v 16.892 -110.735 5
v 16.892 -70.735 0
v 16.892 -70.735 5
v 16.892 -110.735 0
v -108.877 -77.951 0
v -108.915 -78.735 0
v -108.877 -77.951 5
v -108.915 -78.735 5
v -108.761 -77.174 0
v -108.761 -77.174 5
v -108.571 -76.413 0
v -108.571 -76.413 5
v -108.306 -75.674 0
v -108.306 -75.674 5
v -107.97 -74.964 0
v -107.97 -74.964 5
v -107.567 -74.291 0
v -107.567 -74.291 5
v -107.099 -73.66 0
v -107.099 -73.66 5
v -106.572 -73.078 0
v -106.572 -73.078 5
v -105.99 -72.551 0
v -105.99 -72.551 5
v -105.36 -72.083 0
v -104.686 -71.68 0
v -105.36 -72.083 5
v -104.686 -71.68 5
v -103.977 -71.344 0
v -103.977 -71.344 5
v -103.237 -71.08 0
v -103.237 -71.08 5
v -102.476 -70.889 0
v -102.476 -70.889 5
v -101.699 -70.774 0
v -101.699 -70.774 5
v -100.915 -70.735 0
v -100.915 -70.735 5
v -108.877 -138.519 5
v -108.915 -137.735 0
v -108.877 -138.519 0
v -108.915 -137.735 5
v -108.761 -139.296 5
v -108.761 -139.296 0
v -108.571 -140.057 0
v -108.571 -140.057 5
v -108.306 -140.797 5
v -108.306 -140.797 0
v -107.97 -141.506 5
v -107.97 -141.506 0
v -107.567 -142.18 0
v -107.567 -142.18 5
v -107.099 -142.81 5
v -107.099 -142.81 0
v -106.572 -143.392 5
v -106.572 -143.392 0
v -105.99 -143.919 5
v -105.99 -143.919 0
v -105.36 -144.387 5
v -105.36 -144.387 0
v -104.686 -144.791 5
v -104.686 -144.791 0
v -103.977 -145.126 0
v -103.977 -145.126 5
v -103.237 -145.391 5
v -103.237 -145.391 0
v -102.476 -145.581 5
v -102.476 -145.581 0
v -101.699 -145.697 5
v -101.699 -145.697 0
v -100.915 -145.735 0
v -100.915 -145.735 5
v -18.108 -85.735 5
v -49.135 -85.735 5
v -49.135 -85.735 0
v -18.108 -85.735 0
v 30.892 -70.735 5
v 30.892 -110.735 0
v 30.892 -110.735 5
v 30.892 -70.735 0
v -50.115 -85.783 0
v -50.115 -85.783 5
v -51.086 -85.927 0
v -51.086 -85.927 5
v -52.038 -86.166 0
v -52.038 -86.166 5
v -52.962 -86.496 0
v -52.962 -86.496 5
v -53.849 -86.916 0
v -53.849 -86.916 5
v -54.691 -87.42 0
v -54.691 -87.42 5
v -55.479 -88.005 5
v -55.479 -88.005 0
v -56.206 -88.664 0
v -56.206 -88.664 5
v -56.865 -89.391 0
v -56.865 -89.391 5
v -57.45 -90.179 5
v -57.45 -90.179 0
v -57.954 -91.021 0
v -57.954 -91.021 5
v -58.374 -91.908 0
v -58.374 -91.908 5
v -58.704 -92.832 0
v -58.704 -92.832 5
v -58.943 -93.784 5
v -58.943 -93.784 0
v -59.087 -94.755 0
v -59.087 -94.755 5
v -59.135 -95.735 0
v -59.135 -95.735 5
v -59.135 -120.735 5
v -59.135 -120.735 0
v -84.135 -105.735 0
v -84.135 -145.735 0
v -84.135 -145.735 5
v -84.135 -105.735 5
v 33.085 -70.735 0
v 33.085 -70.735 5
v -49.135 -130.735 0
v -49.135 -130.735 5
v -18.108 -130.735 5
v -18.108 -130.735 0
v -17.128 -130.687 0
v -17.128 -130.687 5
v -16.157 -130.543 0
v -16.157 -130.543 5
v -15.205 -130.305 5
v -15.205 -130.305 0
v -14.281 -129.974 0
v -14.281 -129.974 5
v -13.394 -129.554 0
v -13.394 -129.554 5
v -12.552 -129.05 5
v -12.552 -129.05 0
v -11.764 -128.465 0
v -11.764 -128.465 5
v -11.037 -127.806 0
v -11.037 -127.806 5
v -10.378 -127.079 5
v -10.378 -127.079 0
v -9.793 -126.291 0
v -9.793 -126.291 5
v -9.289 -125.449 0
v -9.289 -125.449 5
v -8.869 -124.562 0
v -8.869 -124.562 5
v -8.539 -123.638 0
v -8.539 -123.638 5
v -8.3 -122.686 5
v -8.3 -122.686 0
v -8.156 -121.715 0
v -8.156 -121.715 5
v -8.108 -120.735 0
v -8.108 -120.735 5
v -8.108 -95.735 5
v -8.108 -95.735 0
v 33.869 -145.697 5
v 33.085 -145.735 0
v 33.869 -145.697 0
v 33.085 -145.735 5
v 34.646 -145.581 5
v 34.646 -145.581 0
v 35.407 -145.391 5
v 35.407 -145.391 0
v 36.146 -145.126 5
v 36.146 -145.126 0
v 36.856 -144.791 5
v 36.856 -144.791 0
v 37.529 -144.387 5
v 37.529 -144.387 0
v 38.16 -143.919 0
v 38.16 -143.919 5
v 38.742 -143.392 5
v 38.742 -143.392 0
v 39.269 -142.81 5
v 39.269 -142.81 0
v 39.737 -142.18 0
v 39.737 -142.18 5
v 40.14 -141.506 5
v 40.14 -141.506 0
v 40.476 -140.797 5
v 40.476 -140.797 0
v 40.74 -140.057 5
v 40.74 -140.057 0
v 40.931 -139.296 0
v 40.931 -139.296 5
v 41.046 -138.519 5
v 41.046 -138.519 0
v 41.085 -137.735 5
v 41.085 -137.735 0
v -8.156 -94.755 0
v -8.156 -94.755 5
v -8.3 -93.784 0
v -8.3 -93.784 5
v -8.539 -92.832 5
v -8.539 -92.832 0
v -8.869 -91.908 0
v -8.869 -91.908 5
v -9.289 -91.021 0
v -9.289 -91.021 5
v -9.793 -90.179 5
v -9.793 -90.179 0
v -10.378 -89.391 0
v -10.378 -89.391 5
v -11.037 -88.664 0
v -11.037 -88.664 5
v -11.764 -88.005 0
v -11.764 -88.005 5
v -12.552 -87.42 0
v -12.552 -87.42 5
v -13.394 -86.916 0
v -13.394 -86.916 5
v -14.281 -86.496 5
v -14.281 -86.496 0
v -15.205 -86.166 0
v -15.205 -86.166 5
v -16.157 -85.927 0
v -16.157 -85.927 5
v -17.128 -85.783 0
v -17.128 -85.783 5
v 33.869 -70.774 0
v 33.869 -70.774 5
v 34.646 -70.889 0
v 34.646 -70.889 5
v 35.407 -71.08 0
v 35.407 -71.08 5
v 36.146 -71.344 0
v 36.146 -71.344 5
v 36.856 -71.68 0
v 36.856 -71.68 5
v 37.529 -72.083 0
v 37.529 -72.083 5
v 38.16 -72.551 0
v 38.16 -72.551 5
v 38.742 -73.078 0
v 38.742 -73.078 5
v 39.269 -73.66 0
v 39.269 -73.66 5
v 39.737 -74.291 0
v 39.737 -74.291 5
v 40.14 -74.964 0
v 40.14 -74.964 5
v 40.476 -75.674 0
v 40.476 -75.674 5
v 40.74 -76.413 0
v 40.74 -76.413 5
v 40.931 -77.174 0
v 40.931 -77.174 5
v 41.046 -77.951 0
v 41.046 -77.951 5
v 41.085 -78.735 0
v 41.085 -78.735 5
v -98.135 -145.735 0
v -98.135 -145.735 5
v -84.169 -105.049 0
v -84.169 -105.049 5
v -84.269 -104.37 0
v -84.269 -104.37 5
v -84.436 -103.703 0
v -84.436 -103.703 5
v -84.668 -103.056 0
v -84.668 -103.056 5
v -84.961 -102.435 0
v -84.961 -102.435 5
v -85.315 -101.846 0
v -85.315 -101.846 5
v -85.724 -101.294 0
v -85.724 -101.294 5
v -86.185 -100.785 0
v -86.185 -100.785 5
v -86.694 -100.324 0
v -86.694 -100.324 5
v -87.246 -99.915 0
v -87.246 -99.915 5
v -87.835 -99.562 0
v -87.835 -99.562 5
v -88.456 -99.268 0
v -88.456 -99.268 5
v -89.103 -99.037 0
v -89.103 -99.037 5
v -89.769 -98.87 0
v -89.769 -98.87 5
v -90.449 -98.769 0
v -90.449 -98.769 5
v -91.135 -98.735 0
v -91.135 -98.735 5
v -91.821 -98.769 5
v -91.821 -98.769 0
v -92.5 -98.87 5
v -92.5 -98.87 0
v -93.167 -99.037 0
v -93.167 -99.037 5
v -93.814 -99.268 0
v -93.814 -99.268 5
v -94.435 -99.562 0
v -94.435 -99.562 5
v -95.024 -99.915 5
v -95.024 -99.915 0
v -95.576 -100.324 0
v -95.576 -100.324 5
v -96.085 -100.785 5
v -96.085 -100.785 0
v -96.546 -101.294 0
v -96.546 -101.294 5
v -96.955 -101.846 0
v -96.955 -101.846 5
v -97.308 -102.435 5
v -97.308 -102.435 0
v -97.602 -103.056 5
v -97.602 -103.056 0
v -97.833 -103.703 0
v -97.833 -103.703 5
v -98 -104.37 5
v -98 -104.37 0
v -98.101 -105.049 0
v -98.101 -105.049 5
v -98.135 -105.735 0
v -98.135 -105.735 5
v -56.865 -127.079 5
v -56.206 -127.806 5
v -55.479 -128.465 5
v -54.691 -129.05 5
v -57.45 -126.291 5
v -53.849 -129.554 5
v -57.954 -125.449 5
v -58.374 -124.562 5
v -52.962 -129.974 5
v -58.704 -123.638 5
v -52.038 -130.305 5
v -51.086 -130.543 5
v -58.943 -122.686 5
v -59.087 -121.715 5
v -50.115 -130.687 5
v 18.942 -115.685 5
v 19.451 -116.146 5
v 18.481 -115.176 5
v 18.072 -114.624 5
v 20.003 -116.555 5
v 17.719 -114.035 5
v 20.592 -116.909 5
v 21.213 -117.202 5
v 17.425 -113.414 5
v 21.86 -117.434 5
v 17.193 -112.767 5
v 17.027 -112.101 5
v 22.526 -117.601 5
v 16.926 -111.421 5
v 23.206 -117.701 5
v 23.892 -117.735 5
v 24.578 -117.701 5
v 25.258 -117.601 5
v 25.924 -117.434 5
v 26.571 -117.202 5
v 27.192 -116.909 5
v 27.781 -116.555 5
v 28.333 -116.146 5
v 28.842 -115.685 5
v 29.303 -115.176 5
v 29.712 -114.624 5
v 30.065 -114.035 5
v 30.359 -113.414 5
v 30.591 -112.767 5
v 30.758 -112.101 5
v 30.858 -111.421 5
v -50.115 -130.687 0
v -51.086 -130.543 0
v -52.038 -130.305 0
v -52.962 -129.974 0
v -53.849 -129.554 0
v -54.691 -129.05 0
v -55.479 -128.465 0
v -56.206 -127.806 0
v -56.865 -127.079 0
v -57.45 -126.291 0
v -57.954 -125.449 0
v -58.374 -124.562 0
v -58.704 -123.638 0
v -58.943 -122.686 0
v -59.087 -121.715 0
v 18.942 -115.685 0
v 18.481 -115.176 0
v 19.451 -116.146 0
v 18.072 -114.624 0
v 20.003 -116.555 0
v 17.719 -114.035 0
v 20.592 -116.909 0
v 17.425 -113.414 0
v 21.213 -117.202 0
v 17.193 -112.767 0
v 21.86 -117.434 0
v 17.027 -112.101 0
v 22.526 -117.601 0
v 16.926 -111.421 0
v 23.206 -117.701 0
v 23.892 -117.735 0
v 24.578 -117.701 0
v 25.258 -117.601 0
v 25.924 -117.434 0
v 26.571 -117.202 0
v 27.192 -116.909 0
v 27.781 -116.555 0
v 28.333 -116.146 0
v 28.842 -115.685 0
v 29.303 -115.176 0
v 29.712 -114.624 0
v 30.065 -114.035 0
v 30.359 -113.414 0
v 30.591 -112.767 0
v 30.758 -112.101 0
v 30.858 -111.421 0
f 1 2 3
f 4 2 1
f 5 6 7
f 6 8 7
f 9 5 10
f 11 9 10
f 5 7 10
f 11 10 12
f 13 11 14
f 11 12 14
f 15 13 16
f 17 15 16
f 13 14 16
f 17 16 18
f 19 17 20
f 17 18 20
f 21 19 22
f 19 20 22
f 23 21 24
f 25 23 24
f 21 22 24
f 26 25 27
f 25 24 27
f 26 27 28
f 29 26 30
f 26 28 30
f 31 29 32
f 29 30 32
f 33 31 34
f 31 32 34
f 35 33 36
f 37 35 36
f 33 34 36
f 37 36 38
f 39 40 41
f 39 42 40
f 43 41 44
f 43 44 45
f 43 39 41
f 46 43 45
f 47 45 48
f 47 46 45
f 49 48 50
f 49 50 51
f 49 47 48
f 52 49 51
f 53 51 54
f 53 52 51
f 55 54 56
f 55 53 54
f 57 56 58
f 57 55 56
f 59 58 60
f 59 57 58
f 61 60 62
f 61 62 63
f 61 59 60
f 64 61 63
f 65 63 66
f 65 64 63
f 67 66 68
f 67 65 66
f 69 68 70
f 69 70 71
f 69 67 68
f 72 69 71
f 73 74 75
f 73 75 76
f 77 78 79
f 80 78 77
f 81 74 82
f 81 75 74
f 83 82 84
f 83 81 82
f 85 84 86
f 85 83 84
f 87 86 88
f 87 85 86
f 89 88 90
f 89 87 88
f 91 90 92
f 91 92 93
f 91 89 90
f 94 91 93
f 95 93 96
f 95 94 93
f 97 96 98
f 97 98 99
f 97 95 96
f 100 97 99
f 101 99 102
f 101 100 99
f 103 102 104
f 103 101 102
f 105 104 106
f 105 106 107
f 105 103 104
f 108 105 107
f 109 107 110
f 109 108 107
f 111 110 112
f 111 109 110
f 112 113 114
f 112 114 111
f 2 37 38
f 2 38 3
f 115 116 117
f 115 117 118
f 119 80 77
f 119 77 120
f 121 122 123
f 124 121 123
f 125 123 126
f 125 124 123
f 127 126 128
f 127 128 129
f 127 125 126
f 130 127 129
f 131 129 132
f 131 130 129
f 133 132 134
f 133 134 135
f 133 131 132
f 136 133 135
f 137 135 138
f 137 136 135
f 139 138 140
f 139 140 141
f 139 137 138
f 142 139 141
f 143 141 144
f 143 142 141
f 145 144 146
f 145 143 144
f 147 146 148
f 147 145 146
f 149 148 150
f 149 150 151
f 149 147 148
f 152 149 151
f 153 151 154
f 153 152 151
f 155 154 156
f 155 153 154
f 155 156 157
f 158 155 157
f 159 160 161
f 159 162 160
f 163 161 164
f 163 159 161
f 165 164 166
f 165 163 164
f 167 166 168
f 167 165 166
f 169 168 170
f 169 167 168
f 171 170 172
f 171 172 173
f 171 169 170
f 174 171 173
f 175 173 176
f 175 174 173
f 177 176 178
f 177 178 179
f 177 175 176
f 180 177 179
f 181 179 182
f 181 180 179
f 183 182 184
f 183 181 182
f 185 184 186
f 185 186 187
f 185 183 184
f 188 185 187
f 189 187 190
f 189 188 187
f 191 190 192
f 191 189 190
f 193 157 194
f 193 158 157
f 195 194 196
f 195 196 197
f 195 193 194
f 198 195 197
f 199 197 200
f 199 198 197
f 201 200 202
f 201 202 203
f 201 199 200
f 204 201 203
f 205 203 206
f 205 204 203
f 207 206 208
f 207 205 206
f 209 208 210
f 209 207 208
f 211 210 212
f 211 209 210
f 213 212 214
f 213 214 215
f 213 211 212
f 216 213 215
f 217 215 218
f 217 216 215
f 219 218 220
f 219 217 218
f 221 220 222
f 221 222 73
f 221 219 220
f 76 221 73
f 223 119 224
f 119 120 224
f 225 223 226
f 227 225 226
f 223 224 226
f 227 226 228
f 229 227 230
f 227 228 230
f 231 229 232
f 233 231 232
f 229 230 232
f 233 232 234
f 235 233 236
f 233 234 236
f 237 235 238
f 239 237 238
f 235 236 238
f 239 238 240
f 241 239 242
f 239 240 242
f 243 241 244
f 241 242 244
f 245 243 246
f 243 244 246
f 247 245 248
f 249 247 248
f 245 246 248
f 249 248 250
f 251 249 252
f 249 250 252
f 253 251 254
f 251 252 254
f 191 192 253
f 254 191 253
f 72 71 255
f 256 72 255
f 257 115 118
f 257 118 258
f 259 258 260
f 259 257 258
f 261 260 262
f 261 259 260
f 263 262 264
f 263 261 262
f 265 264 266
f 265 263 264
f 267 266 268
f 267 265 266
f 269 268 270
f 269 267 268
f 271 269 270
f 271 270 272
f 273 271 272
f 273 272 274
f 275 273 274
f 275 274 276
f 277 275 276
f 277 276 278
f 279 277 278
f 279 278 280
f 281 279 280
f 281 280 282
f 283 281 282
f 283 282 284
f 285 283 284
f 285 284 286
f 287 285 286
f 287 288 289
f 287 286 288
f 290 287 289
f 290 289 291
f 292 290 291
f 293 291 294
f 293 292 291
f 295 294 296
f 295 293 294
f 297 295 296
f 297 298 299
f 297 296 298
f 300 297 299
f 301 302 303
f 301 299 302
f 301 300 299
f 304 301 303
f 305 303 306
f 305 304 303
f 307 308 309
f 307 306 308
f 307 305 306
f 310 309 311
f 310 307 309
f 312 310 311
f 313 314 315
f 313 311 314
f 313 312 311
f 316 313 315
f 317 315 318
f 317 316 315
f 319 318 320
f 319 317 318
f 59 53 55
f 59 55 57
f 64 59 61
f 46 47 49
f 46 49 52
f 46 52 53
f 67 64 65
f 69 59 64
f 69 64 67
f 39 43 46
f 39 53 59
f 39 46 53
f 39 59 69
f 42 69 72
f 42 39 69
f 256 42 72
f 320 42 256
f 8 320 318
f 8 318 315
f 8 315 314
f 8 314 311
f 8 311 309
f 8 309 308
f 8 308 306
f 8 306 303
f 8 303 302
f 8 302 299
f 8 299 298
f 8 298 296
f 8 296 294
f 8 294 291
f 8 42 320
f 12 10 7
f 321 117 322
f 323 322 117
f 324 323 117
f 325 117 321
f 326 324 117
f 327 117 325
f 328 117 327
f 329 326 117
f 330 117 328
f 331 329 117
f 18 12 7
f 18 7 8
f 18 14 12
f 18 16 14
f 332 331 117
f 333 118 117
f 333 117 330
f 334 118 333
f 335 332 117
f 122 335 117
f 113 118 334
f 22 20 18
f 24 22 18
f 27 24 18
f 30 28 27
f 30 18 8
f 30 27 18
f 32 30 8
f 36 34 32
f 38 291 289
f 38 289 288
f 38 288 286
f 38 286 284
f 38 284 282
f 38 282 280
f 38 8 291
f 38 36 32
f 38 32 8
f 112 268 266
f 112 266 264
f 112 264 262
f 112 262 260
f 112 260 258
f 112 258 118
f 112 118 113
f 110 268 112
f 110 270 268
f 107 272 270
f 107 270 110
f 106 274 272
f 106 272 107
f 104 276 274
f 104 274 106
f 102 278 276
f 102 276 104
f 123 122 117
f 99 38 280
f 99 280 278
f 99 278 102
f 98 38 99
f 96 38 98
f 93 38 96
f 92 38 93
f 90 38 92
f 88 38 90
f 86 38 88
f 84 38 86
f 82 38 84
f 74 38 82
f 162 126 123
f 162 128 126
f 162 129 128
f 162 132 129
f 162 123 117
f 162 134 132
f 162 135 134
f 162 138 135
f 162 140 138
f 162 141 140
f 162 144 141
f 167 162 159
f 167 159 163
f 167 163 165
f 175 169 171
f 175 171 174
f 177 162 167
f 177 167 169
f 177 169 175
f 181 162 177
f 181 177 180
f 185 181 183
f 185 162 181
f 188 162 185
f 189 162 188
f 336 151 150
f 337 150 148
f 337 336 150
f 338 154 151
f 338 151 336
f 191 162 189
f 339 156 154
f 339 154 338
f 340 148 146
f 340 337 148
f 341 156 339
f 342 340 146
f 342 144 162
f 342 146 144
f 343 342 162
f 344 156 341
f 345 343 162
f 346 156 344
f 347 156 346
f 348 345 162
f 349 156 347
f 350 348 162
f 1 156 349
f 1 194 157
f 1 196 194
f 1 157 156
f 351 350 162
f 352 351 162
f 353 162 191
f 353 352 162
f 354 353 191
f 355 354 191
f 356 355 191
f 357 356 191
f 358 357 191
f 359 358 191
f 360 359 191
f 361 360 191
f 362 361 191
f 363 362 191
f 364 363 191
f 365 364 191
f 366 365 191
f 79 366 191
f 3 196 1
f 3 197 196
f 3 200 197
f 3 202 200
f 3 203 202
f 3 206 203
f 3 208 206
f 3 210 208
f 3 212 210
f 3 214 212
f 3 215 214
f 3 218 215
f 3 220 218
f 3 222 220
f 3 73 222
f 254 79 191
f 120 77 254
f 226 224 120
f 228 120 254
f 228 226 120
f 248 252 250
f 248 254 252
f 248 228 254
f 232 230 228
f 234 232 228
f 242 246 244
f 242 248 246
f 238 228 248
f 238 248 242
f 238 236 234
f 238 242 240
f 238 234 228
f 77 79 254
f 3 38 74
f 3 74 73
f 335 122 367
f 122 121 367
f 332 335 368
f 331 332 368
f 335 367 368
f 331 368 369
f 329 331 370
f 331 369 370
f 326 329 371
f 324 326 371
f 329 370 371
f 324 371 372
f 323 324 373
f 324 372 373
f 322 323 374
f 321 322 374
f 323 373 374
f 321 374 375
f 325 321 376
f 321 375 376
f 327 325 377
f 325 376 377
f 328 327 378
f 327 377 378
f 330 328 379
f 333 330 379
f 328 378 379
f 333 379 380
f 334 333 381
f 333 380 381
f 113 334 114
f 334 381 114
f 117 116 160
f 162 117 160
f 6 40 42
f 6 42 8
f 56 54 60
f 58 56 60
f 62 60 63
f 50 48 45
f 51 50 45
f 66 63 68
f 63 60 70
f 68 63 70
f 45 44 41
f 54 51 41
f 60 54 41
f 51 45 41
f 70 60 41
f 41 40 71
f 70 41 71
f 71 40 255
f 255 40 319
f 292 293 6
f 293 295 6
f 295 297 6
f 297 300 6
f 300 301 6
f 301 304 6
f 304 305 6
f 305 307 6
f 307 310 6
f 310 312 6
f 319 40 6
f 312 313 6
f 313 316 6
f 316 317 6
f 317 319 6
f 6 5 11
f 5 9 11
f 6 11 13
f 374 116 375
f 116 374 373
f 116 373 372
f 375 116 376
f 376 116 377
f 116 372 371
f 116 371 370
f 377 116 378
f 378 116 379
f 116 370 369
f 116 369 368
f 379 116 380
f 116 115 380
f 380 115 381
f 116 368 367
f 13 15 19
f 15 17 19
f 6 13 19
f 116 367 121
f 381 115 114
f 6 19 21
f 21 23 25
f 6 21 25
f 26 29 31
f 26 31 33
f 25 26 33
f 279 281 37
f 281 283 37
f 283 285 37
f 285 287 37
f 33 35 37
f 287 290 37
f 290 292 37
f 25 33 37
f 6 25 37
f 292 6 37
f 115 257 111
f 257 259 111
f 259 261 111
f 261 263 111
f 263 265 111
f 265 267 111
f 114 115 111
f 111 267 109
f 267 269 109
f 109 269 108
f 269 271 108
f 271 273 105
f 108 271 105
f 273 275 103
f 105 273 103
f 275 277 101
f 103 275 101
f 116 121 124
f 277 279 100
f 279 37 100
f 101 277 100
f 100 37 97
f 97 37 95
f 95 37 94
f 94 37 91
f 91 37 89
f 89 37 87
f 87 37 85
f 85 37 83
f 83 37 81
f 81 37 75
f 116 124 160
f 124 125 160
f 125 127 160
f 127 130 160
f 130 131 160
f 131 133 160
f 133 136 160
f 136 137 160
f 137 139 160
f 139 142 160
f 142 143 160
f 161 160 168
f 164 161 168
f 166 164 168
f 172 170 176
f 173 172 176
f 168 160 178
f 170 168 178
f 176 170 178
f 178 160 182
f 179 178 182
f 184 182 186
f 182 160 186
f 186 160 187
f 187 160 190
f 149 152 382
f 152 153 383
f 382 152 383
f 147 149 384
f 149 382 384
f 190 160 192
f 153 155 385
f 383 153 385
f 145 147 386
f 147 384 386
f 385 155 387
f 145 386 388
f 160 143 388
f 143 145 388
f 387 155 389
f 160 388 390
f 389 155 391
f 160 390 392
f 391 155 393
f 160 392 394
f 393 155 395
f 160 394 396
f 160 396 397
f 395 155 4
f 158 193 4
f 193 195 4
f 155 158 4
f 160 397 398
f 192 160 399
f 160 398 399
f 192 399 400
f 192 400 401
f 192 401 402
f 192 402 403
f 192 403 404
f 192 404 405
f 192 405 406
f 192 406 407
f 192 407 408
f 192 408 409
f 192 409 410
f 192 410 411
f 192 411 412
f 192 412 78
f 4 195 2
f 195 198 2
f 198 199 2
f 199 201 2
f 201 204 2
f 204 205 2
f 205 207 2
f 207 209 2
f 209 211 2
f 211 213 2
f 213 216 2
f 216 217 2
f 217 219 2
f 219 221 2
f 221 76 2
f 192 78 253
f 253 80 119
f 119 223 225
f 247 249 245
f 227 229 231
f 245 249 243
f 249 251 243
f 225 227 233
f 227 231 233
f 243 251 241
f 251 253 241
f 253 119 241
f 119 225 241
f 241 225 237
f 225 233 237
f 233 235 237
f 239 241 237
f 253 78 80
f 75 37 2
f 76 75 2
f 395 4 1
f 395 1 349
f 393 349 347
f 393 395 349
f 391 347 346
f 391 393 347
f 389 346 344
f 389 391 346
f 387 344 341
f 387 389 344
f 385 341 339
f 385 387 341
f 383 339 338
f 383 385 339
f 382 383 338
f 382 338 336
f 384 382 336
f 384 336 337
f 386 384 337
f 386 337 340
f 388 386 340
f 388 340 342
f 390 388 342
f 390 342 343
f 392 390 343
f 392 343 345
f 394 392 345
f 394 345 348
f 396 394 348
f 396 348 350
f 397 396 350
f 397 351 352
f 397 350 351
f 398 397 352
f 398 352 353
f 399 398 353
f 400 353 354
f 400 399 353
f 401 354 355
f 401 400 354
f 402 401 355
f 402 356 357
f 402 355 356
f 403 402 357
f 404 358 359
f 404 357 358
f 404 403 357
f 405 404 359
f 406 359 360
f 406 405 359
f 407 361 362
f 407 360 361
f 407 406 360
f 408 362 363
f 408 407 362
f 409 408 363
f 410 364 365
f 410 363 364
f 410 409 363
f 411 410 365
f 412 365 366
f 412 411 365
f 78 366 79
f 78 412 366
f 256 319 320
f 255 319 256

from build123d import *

# Parameters (mm, degrees)
F0_W     = 150
F0_H     = 75
F1_DEPTH = 5
F3_DEPTH = 282
F4_DEPTH = 5.001
F5_W     = 51.0268339871
F5_H     = 45
F6_DEPTH = 5.001
F7_R     = 10
F8_R     = 8


# Not quite as in the source:
# - an extrude ends at something that could not be found from the text; its depth is read off the source's solid


with BuildPart() as f1:
    # F0 (on Top) → F1 (new body)
    with BuildSketch(Plane.XY):
        with Locations((-33.9150866494, -108.2351529738)):
            Rectangle(F0_W, F0_H)
    extrude(amount=F1_DEPTH)

    # F2 (on Top) → F3 (cut, through all)
    with BuildSketch(Plane.XY):
        with BuildLine():
            Line((-98.1348048404, -105.7351529738), (-98.1348048404, -145.7351529738))
            Line((-98.1348048404, -145.7351529738), (-84.1348048404, -145.7351529738))
            Line((-84.1348048404, -145.7351529738), (-84.1348048404, -105.7351529738))
            ThreePointArc((-84.1348048404, -105.7351529738), (-91.1348048404, -98.7351529738), (-98.1348048404, -105.7351529738))
        make_face()
        with BuildLine():
            Line((30.8920291467, -110.7351529738), (30.8920291467, -70.7351529738))
            Line((30.8920291467, -70.7351529738), (16.8920291467, -70.7351529738))
            Line((16.8920291467, -70.7351529738), (16.8920291467, -110.7351529738))
            ThreePointArc((16.8920291467, -110.7351529738), (23.8920291467, -117.7351529738), (30.8920291467, -110.7351529738))
        make_face()
    extrude(amount=-F3_DEPTH, mode=Mode.SUBTRACT)

    # F2 (on Top) → F4 (cut, through all)
    with BuildSketch(Plane.XY):
        with BuildLine():
            Line((-98.1348048404, -105.7351529738), (-98.1348048404, -145.7351529738))
            Line((-98.1348048404, -145.7351529738), (-84.1348048404, -145.7351529738))
            Line((-84.1348048404, -145.7351529738), (-84.1348048404, -105.7351529738))
            ThreePointArc((-84.1348048404, -105.7351529738), (-91.1348048404, -98.7351529738), (-98.1348048404, -105.7351529738))
        make_face()
        with BuildLine():
            Line((30.8920291467, -110.7351529738), (30.8920291467, -70.7351529738))
            Line((30.8920291467, -70.7351529738), (16.8920291467, -70.7351529738))
            Line((16.8920291467, -70.7351529738), (16.8920291467, -110.7351529738))
            ThreePointArc((16.8920291467, -110.7351529738), (23.8920291467, -117.7351529738), (30.8920291467, -110.7351529738))
        make_face()
    extrude(amount=F4_DEPTH, mode=Mode.SUBTRACT)

    # F5 (on face) → F6 (cut, through all)
    with BuildSketch(Plane.XY.offset(5)):
        with Locations((-33.6213878469, -108.2351529738)):
            Rectangle(F5_W, F5_H)
    extrude(amount=-F6_DEPTH, mode=Mode.SUBTRACT)

    # F7
    f7_edges = [f1.edges().sort_by_distance(p)[0] for p in [
        (-8.107971, -85.735153, 2.5),
        (-8.107971, -130.735153, 2.5),
        (-59.134805, -130.735153, 2.5),
        (-59.134805, -85.735153, 2.5),
    ]]
    fillet(f7_edges, radius=F7_R)

    # F8
    f8_edges = [f1.edges().sort_by_distance(p)[0] for p in [
        (41.084913, -145.735153, 2.5),
        (41.084913, -70.735153, 2.5),
        (-108.915087, -70.735153, 2.5),
        (-108.915087, -145.735153, 2.5),
    ]]
    fillet(f8_edges, radius=F8_R)


solid = f1.part
